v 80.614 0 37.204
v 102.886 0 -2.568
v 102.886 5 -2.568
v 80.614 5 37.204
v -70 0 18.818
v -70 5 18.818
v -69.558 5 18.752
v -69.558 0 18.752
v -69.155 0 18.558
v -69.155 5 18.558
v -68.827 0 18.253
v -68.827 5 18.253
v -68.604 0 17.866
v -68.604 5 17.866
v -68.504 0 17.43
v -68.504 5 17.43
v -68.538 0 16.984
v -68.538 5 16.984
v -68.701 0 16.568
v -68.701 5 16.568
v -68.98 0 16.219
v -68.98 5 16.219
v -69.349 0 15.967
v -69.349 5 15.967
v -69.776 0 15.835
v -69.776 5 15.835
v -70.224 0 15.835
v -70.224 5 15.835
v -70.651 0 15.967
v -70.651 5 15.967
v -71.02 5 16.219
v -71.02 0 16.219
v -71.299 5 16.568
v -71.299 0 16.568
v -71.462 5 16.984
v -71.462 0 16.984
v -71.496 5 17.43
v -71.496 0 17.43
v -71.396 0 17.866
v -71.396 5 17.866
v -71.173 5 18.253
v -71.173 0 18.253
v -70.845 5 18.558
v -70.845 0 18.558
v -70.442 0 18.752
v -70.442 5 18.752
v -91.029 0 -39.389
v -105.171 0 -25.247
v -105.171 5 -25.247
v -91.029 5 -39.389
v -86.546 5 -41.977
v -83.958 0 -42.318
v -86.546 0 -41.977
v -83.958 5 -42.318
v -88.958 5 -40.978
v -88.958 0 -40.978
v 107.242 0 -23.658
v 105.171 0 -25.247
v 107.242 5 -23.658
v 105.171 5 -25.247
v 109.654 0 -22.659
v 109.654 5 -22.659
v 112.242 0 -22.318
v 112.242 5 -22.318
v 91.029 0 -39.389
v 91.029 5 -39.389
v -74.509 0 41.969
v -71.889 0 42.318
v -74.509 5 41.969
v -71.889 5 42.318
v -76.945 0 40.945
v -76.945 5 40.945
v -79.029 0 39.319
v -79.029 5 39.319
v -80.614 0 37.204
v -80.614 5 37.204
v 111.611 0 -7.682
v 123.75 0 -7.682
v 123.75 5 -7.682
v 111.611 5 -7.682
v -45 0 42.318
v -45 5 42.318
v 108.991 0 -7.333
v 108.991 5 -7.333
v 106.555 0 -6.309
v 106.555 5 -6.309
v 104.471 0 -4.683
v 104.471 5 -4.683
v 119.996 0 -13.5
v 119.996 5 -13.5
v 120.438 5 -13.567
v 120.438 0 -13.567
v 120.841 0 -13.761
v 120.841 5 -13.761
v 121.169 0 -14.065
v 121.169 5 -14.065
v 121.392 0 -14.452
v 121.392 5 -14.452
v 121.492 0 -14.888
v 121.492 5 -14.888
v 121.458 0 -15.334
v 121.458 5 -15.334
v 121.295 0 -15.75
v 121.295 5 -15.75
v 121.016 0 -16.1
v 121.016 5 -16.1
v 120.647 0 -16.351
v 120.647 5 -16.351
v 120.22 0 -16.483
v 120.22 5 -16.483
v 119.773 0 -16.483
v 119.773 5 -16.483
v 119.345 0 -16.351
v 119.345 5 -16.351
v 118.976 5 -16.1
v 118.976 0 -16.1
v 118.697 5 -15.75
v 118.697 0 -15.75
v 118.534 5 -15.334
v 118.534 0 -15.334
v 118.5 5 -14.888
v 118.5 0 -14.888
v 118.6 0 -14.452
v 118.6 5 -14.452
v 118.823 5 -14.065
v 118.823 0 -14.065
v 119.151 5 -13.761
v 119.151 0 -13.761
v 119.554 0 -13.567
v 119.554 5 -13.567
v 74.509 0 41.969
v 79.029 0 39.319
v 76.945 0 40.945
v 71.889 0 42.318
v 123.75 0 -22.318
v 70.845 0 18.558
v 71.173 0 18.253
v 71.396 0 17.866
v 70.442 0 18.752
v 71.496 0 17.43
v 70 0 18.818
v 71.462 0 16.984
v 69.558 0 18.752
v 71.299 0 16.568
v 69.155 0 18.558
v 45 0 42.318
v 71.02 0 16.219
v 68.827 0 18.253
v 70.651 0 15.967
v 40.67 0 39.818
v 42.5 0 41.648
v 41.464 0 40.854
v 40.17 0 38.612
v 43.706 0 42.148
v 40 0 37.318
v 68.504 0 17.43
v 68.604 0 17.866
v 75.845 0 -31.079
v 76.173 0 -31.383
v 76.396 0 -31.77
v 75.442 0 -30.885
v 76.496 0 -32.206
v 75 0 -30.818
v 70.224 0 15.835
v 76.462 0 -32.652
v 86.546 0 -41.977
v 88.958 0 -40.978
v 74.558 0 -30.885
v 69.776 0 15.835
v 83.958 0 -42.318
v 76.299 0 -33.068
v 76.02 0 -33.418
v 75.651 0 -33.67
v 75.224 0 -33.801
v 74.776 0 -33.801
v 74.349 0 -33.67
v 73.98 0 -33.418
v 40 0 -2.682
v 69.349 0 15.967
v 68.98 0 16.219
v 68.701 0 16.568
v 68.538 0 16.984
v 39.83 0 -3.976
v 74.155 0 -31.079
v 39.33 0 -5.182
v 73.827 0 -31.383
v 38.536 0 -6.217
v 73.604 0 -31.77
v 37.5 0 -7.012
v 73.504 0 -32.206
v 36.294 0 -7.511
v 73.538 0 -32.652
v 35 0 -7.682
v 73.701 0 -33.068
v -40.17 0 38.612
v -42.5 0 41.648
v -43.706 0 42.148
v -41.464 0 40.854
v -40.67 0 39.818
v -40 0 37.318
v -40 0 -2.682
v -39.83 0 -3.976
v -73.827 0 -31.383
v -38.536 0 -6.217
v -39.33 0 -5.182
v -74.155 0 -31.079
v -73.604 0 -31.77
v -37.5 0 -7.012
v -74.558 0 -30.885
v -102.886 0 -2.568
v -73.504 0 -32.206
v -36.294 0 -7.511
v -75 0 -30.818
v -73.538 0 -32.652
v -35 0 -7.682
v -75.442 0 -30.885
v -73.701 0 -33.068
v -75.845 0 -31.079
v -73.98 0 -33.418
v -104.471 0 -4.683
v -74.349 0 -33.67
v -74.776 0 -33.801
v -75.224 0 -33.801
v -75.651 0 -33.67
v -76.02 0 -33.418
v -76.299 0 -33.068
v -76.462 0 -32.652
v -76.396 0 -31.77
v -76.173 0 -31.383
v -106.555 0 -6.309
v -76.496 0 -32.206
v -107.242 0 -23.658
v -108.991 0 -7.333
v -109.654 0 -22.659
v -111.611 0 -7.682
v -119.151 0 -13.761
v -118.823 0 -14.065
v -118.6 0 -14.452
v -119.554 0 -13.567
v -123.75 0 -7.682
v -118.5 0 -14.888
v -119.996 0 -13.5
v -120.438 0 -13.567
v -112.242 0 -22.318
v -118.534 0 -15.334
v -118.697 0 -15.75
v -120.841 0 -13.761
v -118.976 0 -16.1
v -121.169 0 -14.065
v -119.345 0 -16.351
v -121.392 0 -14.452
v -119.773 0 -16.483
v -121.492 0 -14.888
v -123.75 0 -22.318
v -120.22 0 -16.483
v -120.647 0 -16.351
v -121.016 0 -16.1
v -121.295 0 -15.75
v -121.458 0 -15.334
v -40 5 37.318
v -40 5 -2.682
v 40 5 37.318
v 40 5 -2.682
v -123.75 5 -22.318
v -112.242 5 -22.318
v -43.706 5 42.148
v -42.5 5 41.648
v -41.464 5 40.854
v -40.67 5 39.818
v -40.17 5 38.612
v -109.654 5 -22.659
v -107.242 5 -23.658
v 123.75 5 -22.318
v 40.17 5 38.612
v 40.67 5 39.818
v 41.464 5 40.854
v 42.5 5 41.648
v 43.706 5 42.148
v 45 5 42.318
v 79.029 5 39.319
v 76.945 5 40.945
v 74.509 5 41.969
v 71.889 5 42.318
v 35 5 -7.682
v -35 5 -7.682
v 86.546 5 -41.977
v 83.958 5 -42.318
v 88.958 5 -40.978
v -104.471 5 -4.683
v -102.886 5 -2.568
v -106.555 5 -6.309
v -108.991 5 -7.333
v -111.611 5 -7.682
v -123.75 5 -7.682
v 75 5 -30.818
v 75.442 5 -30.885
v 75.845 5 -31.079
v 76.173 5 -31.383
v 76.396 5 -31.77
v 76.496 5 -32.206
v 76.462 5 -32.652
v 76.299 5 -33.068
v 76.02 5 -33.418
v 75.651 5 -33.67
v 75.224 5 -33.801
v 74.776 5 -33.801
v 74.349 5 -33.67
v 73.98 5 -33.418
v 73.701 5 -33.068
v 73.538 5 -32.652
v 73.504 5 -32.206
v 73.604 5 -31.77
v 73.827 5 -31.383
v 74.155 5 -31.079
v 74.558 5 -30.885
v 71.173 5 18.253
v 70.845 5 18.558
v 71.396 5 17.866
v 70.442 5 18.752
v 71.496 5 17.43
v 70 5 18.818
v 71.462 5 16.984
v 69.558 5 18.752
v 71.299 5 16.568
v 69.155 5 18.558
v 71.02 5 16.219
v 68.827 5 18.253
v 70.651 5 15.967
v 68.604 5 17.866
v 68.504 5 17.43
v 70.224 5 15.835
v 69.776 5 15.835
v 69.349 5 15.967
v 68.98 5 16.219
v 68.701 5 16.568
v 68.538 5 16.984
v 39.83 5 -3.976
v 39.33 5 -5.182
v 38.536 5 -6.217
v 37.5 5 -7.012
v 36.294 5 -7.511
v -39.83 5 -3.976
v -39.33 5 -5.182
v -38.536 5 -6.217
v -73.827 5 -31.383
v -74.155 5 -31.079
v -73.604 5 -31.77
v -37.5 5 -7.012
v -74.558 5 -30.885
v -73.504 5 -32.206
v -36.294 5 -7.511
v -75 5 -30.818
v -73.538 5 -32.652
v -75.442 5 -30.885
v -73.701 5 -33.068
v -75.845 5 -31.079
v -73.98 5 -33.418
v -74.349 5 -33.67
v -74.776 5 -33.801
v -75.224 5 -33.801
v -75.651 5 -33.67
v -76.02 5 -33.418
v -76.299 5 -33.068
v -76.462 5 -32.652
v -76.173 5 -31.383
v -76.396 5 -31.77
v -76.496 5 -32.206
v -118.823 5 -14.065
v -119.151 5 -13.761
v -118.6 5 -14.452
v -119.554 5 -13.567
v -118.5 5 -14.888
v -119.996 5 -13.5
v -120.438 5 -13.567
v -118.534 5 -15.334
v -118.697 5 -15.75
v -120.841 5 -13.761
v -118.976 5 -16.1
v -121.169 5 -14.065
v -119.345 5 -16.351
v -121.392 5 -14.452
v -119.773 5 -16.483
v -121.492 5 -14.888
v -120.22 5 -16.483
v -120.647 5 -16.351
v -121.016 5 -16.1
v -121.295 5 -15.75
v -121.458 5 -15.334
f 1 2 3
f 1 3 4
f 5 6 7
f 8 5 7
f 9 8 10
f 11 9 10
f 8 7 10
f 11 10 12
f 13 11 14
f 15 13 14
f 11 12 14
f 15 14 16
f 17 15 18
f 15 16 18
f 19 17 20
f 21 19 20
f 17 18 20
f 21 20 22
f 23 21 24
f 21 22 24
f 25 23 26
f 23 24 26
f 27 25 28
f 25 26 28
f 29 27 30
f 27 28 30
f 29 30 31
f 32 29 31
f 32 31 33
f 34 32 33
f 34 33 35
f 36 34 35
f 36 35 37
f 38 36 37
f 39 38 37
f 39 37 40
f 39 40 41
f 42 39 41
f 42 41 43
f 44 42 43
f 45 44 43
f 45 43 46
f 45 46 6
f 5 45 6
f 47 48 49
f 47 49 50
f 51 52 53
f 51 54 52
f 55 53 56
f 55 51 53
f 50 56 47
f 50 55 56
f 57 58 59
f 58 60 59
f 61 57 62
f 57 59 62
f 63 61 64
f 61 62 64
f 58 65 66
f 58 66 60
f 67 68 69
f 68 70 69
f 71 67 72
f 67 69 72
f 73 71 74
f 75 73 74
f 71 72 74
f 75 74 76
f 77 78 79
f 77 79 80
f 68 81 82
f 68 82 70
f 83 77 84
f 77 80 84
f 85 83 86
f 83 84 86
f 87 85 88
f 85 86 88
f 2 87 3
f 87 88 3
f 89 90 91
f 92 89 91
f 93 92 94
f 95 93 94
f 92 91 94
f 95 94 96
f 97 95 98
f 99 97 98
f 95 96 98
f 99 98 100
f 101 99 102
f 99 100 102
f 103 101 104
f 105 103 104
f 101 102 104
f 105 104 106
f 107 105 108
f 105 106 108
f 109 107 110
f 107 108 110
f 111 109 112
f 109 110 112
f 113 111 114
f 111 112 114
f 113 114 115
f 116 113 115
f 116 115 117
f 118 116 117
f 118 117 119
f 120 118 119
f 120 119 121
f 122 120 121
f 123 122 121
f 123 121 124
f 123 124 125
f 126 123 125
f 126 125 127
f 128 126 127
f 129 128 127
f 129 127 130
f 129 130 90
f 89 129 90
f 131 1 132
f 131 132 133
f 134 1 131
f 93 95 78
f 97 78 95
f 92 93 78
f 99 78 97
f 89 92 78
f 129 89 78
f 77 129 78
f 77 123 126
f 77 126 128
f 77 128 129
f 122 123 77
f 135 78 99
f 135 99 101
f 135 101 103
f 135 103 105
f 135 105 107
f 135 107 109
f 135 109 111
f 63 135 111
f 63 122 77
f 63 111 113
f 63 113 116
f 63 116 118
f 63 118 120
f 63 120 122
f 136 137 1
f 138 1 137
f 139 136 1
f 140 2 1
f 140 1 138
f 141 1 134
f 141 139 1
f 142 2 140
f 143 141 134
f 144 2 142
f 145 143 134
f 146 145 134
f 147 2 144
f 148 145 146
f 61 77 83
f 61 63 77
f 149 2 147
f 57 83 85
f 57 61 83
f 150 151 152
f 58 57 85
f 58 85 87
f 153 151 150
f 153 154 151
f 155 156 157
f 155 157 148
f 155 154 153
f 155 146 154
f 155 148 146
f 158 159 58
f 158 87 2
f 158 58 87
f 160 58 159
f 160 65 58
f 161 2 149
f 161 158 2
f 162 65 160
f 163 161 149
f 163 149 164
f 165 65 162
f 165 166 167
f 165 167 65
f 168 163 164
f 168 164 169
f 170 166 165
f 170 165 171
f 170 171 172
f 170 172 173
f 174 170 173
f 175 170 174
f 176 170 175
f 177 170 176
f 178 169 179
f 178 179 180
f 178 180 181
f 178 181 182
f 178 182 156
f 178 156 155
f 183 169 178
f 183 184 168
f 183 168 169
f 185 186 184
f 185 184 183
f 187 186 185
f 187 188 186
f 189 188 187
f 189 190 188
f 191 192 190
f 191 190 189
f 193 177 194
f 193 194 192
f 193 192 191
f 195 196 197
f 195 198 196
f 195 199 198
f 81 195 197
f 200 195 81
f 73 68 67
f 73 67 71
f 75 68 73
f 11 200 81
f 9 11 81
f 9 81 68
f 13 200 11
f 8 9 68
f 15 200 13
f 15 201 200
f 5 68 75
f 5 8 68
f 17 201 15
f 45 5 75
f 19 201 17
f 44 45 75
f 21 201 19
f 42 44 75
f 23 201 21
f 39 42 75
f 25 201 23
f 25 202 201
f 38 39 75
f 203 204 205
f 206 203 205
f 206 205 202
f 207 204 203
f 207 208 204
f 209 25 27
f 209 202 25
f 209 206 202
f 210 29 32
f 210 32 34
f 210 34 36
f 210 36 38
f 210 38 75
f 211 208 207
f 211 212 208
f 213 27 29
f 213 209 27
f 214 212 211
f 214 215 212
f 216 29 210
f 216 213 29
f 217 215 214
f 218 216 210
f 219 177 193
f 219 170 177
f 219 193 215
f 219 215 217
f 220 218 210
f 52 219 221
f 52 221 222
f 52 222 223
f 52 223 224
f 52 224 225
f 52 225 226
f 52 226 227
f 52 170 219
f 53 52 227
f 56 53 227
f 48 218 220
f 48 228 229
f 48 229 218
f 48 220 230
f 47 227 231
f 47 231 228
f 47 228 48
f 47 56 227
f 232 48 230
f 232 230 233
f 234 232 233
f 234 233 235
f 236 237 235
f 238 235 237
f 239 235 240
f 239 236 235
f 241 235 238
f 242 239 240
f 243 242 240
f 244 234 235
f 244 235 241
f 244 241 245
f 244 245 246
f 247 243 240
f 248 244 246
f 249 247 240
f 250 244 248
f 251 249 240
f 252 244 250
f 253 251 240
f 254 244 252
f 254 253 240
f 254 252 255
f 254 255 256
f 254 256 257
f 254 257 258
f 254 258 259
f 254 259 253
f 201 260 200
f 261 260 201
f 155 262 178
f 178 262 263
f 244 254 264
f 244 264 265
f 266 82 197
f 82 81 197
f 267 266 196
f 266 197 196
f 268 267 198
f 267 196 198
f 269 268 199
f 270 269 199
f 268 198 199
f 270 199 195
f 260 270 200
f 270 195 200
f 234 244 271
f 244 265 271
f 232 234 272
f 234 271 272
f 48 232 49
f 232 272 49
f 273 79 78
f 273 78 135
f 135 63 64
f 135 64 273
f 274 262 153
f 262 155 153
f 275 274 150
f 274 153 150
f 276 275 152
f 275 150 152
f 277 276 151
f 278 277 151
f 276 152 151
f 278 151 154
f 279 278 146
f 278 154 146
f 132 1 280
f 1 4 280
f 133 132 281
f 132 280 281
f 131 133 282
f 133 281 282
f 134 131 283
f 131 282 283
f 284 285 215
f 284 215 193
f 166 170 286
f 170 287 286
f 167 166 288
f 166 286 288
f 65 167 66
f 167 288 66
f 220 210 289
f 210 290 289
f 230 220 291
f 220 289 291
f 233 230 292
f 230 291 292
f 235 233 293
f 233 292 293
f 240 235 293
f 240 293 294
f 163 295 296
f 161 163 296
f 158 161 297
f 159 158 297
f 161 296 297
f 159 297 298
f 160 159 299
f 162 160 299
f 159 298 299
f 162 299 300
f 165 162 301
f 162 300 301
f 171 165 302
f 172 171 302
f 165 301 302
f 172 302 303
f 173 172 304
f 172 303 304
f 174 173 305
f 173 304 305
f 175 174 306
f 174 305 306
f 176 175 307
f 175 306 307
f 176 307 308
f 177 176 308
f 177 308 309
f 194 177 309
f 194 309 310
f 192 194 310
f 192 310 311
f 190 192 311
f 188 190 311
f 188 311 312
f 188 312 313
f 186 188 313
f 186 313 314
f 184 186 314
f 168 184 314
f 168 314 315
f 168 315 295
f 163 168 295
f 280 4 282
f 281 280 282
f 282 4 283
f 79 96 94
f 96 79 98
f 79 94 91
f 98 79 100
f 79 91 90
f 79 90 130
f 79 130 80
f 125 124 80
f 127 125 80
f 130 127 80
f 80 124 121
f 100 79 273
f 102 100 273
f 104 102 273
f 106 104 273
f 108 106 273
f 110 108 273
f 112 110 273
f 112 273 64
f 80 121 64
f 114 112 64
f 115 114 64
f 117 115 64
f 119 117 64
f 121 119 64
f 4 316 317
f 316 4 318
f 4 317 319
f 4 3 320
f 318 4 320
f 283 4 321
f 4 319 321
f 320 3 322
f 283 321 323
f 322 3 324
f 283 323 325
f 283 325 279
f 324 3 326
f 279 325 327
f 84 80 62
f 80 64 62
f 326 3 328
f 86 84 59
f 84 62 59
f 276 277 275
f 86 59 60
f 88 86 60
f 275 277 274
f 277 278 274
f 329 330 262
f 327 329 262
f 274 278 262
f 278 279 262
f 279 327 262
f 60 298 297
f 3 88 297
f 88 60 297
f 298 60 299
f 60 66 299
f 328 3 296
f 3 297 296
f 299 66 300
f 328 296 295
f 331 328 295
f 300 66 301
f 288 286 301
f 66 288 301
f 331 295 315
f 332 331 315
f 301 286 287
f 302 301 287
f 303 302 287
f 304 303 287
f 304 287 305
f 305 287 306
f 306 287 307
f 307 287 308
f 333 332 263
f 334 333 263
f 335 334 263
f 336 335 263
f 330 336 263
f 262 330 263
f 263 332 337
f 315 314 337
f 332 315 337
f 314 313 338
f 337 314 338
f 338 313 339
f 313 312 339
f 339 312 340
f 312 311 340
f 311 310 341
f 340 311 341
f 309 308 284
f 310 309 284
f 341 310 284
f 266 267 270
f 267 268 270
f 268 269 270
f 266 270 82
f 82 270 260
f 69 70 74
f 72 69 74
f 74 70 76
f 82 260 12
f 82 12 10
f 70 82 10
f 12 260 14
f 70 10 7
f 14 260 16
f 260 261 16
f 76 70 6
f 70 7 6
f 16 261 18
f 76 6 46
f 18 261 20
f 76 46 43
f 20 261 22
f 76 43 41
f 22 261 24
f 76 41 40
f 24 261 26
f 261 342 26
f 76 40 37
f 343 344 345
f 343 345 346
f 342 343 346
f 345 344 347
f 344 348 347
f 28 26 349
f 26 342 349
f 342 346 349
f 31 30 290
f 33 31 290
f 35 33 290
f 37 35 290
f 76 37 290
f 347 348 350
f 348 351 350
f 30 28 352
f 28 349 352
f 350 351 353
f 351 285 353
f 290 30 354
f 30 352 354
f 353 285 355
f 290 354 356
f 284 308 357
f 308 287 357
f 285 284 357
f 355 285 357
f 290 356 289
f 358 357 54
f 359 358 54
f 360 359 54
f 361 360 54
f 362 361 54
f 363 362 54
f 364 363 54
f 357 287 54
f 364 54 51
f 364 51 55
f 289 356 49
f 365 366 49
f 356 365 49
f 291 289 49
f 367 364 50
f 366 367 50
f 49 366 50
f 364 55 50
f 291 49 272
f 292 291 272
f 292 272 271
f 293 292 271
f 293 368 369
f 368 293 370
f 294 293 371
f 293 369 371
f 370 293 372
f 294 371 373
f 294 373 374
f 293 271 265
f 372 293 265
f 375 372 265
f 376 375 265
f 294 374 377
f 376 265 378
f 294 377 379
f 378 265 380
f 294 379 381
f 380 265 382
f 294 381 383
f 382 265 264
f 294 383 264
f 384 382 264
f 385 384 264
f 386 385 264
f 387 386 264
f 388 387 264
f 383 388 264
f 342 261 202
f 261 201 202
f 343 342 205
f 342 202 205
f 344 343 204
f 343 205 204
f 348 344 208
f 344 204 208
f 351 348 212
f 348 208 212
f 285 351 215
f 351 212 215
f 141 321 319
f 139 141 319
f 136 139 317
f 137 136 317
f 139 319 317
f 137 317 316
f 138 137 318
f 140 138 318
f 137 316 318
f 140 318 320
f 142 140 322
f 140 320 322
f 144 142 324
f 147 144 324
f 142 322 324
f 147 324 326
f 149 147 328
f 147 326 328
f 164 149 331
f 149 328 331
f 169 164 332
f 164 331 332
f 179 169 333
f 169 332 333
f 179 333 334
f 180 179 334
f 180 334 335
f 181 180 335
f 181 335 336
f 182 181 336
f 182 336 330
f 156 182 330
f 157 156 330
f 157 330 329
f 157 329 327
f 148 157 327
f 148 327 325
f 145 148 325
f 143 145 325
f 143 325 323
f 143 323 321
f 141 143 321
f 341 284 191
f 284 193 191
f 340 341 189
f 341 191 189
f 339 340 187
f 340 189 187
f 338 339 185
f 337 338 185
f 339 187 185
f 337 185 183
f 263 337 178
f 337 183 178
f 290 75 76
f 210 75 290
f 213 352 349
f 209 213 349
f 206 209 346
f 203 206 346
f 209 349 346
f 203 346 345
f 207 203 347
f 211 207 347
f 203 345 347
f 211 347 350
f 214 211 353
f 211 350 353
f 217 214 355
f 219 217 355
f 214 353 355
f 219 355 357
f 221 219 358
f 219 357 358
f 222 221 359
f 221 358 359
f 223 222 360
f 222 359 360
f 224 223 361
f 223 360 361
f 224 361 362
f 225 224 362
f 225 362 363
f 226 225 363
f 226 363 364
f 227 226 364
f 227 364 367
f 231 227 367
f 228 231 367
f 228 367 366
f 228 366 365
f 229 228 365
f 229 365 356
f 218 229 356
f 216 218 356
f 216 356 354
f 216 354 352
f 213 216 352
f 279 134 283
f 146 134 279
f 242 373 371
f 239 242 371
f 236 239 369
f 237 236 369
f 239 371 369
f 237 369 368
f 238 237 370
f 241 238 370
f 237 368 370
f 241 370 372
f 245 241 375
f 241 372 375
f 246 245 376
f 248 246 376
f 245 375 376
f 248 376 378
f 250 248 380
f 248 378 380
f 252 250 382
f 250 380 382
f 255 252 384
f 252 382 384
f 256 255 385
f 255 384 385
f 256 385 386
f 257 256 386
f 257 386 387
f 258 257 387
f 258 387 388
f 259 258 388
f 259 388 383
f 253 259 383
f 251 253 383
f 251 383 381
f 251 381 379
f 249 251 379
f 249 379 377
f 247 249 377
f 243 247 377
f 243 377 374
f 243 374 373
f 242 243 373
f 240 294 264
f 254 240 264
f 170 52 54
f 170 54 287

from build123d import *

# Parameters (mm, degrees)
SALIENTE_EXTRUIR1_DEPTH = 5
REDONDEO1_R             = 10
CROQUIS2_R              = 1.5
CORTAR_EXTRUIR1_DEPTH   = 135.669558943
CROQUIS4_W              = 80
CROQUIS4_H              = 50
CORTAR_EXTRUIR2_DEPTH   = 135.669558943
REDONDEO2_R             = 5
CROQUIS5_W              = 4
CROQUIS5_H              = 14.636342218
CORTAR_EXTRUIR3_DEPTH   = 135.669558943


with BuildPart() as part:
    # Croquis1 → Saliente-Extruir1 (new body)
    with BuildSketch(Plane(origin=(0, 0, 0), x_dir=(1, 0, 0), z_dir=(0, 1, 0))):
        Polygon((-88.1, 42.318171109), (88.1, 42.318171109), (108.1, 22.318171109), (127.75, 22.318171109), (127.75, 7.681828891), (105.75, 7.681828891), (77.75, -42.318171109), (-77.75, -42.318171109), (-105.75, 7.681828891), (-127.75, 7.681828891), (-127.75, 22.318171109), (-108.1, 22.318171109), align=None)
    extrude(amount=SALIENTE_EXTRUIR1_DEPTH)

    # Redondeo1
    redondeo1_edges = [part.edges().sort_by_distance(p)[0] for p in [
        (-88.1, 2.5, -42.318171109),
        (88.1, 2.5, -42.318171109),
        (108.1, 2.5, -22.318171109),
        (105.75, 2.5, -7.681828891),
        (77.75, 2.5, 42.318171109),
        (-77.75, 2.5, 42.318171109),
        (-105.75, 2.5, -7.681828891),
        (-108.1, 2.5, -22.318171109),
    ]]
    fillet(redondeo1_edges, radius=REDONDEO1_R)

    # Croquis2 → Cortar-Extruir1 (cut, through all)
    with BuildSketch(Plane(origin=(0, 5, 0), x_dir=(1, 0, 0), z_dir=(0, 1, 0))):
        with Locations(Location((70, -17.318171109, 0), (0, 0, 270))):
            Circle(CROQUIS2_R)
        with Locations(Location((-70, -17.318171109, 0), (0, 0, 270))):
            Circle(CROQUIS2_R)
        with Locations(Location((-119.996067812, 15, 0), (0, 0, 270))):
            Circle(CROQUIS2_R)
        with Locations(Location((119.996067812, 15, 0), (0, 0, 270))):
            Circle(CROQUIS2_R)
        with Locations(Location((-75, 32.318171109, 0), (0, 0, 270))):
            Circle(CROQUIS2_R)
        with Locations(Location((75, 32.318171109, 0), (0, 0, 270))):
            Circle(CROQUIS2_R)
        with Locations(Location((-17.5, -17.318171109, 0), (0, 0, 270))):
            Circle(CROQUIS2_R)
        with Locations(Location((17.5, -17.318171109, 0), (0, 0, 270))):
            Circle(CROQUIS2_R)
        with Locations(Location((-17.5, -37.318171109, 0), (0, 0, 270))):
            Circle(CROQUIS2_R)
        with Locations(Location((17.5, -37.318171109, 0), (0, 0, 270))):
            Circle(CROQUIS2_R)
    extrude(amount=-CORTAR_EXTRUIR1_DEPTH, mode=Mode.SUBTRACT)

    # Croquis4 → Cortar-Extruir2 (cut, through all)
    with BuildSketch(Plane(origin=(0, 5, 0), x_dir=(1, 0, 0), z_dir=(0, 1, 0))):
        with Locations((0, -17.318171109)):
            Rectangle(CROQUIS4_W, CROQUIS4_H)
    extrude(amount=-CORTAR_EXTRUIR2_DEPTH, mode=Mode.SUBTRACT)

    # Redondeo2
    redondeo2_edges = [part.edges().sort_by_distance(p)[0] for p in [
        (40, 2.5, 42.318171109),
        (-40, 2.5, 42.318171109),
        (-40, 2.5, -7.681828891),
        (40, 2.5, -7.681828891),
    ]]
    fillet(redondeo2_edges, radius=REDONDEO2_R)

    # Croquis5 → Cortar-Extruir3 (cut, through all)
    with BuildSketch(Plane(origin=(0, 5, 0), x_dir=(1, 0, 0), z_dir=(0, 1, 0))):
        with Locations((-125.75, 15)):
            Rectangle(CROQUIS5_W, CROQUIS5_H)
        with Locations((125.75, 15)):
            Rectangle(CROQUIS5_W, CROQUIS5_H)
    extrude(amount=-CORTAR_EXTRUIR3_DEPTH, mode=Mode.SUBTRACT)


solid = part.part
